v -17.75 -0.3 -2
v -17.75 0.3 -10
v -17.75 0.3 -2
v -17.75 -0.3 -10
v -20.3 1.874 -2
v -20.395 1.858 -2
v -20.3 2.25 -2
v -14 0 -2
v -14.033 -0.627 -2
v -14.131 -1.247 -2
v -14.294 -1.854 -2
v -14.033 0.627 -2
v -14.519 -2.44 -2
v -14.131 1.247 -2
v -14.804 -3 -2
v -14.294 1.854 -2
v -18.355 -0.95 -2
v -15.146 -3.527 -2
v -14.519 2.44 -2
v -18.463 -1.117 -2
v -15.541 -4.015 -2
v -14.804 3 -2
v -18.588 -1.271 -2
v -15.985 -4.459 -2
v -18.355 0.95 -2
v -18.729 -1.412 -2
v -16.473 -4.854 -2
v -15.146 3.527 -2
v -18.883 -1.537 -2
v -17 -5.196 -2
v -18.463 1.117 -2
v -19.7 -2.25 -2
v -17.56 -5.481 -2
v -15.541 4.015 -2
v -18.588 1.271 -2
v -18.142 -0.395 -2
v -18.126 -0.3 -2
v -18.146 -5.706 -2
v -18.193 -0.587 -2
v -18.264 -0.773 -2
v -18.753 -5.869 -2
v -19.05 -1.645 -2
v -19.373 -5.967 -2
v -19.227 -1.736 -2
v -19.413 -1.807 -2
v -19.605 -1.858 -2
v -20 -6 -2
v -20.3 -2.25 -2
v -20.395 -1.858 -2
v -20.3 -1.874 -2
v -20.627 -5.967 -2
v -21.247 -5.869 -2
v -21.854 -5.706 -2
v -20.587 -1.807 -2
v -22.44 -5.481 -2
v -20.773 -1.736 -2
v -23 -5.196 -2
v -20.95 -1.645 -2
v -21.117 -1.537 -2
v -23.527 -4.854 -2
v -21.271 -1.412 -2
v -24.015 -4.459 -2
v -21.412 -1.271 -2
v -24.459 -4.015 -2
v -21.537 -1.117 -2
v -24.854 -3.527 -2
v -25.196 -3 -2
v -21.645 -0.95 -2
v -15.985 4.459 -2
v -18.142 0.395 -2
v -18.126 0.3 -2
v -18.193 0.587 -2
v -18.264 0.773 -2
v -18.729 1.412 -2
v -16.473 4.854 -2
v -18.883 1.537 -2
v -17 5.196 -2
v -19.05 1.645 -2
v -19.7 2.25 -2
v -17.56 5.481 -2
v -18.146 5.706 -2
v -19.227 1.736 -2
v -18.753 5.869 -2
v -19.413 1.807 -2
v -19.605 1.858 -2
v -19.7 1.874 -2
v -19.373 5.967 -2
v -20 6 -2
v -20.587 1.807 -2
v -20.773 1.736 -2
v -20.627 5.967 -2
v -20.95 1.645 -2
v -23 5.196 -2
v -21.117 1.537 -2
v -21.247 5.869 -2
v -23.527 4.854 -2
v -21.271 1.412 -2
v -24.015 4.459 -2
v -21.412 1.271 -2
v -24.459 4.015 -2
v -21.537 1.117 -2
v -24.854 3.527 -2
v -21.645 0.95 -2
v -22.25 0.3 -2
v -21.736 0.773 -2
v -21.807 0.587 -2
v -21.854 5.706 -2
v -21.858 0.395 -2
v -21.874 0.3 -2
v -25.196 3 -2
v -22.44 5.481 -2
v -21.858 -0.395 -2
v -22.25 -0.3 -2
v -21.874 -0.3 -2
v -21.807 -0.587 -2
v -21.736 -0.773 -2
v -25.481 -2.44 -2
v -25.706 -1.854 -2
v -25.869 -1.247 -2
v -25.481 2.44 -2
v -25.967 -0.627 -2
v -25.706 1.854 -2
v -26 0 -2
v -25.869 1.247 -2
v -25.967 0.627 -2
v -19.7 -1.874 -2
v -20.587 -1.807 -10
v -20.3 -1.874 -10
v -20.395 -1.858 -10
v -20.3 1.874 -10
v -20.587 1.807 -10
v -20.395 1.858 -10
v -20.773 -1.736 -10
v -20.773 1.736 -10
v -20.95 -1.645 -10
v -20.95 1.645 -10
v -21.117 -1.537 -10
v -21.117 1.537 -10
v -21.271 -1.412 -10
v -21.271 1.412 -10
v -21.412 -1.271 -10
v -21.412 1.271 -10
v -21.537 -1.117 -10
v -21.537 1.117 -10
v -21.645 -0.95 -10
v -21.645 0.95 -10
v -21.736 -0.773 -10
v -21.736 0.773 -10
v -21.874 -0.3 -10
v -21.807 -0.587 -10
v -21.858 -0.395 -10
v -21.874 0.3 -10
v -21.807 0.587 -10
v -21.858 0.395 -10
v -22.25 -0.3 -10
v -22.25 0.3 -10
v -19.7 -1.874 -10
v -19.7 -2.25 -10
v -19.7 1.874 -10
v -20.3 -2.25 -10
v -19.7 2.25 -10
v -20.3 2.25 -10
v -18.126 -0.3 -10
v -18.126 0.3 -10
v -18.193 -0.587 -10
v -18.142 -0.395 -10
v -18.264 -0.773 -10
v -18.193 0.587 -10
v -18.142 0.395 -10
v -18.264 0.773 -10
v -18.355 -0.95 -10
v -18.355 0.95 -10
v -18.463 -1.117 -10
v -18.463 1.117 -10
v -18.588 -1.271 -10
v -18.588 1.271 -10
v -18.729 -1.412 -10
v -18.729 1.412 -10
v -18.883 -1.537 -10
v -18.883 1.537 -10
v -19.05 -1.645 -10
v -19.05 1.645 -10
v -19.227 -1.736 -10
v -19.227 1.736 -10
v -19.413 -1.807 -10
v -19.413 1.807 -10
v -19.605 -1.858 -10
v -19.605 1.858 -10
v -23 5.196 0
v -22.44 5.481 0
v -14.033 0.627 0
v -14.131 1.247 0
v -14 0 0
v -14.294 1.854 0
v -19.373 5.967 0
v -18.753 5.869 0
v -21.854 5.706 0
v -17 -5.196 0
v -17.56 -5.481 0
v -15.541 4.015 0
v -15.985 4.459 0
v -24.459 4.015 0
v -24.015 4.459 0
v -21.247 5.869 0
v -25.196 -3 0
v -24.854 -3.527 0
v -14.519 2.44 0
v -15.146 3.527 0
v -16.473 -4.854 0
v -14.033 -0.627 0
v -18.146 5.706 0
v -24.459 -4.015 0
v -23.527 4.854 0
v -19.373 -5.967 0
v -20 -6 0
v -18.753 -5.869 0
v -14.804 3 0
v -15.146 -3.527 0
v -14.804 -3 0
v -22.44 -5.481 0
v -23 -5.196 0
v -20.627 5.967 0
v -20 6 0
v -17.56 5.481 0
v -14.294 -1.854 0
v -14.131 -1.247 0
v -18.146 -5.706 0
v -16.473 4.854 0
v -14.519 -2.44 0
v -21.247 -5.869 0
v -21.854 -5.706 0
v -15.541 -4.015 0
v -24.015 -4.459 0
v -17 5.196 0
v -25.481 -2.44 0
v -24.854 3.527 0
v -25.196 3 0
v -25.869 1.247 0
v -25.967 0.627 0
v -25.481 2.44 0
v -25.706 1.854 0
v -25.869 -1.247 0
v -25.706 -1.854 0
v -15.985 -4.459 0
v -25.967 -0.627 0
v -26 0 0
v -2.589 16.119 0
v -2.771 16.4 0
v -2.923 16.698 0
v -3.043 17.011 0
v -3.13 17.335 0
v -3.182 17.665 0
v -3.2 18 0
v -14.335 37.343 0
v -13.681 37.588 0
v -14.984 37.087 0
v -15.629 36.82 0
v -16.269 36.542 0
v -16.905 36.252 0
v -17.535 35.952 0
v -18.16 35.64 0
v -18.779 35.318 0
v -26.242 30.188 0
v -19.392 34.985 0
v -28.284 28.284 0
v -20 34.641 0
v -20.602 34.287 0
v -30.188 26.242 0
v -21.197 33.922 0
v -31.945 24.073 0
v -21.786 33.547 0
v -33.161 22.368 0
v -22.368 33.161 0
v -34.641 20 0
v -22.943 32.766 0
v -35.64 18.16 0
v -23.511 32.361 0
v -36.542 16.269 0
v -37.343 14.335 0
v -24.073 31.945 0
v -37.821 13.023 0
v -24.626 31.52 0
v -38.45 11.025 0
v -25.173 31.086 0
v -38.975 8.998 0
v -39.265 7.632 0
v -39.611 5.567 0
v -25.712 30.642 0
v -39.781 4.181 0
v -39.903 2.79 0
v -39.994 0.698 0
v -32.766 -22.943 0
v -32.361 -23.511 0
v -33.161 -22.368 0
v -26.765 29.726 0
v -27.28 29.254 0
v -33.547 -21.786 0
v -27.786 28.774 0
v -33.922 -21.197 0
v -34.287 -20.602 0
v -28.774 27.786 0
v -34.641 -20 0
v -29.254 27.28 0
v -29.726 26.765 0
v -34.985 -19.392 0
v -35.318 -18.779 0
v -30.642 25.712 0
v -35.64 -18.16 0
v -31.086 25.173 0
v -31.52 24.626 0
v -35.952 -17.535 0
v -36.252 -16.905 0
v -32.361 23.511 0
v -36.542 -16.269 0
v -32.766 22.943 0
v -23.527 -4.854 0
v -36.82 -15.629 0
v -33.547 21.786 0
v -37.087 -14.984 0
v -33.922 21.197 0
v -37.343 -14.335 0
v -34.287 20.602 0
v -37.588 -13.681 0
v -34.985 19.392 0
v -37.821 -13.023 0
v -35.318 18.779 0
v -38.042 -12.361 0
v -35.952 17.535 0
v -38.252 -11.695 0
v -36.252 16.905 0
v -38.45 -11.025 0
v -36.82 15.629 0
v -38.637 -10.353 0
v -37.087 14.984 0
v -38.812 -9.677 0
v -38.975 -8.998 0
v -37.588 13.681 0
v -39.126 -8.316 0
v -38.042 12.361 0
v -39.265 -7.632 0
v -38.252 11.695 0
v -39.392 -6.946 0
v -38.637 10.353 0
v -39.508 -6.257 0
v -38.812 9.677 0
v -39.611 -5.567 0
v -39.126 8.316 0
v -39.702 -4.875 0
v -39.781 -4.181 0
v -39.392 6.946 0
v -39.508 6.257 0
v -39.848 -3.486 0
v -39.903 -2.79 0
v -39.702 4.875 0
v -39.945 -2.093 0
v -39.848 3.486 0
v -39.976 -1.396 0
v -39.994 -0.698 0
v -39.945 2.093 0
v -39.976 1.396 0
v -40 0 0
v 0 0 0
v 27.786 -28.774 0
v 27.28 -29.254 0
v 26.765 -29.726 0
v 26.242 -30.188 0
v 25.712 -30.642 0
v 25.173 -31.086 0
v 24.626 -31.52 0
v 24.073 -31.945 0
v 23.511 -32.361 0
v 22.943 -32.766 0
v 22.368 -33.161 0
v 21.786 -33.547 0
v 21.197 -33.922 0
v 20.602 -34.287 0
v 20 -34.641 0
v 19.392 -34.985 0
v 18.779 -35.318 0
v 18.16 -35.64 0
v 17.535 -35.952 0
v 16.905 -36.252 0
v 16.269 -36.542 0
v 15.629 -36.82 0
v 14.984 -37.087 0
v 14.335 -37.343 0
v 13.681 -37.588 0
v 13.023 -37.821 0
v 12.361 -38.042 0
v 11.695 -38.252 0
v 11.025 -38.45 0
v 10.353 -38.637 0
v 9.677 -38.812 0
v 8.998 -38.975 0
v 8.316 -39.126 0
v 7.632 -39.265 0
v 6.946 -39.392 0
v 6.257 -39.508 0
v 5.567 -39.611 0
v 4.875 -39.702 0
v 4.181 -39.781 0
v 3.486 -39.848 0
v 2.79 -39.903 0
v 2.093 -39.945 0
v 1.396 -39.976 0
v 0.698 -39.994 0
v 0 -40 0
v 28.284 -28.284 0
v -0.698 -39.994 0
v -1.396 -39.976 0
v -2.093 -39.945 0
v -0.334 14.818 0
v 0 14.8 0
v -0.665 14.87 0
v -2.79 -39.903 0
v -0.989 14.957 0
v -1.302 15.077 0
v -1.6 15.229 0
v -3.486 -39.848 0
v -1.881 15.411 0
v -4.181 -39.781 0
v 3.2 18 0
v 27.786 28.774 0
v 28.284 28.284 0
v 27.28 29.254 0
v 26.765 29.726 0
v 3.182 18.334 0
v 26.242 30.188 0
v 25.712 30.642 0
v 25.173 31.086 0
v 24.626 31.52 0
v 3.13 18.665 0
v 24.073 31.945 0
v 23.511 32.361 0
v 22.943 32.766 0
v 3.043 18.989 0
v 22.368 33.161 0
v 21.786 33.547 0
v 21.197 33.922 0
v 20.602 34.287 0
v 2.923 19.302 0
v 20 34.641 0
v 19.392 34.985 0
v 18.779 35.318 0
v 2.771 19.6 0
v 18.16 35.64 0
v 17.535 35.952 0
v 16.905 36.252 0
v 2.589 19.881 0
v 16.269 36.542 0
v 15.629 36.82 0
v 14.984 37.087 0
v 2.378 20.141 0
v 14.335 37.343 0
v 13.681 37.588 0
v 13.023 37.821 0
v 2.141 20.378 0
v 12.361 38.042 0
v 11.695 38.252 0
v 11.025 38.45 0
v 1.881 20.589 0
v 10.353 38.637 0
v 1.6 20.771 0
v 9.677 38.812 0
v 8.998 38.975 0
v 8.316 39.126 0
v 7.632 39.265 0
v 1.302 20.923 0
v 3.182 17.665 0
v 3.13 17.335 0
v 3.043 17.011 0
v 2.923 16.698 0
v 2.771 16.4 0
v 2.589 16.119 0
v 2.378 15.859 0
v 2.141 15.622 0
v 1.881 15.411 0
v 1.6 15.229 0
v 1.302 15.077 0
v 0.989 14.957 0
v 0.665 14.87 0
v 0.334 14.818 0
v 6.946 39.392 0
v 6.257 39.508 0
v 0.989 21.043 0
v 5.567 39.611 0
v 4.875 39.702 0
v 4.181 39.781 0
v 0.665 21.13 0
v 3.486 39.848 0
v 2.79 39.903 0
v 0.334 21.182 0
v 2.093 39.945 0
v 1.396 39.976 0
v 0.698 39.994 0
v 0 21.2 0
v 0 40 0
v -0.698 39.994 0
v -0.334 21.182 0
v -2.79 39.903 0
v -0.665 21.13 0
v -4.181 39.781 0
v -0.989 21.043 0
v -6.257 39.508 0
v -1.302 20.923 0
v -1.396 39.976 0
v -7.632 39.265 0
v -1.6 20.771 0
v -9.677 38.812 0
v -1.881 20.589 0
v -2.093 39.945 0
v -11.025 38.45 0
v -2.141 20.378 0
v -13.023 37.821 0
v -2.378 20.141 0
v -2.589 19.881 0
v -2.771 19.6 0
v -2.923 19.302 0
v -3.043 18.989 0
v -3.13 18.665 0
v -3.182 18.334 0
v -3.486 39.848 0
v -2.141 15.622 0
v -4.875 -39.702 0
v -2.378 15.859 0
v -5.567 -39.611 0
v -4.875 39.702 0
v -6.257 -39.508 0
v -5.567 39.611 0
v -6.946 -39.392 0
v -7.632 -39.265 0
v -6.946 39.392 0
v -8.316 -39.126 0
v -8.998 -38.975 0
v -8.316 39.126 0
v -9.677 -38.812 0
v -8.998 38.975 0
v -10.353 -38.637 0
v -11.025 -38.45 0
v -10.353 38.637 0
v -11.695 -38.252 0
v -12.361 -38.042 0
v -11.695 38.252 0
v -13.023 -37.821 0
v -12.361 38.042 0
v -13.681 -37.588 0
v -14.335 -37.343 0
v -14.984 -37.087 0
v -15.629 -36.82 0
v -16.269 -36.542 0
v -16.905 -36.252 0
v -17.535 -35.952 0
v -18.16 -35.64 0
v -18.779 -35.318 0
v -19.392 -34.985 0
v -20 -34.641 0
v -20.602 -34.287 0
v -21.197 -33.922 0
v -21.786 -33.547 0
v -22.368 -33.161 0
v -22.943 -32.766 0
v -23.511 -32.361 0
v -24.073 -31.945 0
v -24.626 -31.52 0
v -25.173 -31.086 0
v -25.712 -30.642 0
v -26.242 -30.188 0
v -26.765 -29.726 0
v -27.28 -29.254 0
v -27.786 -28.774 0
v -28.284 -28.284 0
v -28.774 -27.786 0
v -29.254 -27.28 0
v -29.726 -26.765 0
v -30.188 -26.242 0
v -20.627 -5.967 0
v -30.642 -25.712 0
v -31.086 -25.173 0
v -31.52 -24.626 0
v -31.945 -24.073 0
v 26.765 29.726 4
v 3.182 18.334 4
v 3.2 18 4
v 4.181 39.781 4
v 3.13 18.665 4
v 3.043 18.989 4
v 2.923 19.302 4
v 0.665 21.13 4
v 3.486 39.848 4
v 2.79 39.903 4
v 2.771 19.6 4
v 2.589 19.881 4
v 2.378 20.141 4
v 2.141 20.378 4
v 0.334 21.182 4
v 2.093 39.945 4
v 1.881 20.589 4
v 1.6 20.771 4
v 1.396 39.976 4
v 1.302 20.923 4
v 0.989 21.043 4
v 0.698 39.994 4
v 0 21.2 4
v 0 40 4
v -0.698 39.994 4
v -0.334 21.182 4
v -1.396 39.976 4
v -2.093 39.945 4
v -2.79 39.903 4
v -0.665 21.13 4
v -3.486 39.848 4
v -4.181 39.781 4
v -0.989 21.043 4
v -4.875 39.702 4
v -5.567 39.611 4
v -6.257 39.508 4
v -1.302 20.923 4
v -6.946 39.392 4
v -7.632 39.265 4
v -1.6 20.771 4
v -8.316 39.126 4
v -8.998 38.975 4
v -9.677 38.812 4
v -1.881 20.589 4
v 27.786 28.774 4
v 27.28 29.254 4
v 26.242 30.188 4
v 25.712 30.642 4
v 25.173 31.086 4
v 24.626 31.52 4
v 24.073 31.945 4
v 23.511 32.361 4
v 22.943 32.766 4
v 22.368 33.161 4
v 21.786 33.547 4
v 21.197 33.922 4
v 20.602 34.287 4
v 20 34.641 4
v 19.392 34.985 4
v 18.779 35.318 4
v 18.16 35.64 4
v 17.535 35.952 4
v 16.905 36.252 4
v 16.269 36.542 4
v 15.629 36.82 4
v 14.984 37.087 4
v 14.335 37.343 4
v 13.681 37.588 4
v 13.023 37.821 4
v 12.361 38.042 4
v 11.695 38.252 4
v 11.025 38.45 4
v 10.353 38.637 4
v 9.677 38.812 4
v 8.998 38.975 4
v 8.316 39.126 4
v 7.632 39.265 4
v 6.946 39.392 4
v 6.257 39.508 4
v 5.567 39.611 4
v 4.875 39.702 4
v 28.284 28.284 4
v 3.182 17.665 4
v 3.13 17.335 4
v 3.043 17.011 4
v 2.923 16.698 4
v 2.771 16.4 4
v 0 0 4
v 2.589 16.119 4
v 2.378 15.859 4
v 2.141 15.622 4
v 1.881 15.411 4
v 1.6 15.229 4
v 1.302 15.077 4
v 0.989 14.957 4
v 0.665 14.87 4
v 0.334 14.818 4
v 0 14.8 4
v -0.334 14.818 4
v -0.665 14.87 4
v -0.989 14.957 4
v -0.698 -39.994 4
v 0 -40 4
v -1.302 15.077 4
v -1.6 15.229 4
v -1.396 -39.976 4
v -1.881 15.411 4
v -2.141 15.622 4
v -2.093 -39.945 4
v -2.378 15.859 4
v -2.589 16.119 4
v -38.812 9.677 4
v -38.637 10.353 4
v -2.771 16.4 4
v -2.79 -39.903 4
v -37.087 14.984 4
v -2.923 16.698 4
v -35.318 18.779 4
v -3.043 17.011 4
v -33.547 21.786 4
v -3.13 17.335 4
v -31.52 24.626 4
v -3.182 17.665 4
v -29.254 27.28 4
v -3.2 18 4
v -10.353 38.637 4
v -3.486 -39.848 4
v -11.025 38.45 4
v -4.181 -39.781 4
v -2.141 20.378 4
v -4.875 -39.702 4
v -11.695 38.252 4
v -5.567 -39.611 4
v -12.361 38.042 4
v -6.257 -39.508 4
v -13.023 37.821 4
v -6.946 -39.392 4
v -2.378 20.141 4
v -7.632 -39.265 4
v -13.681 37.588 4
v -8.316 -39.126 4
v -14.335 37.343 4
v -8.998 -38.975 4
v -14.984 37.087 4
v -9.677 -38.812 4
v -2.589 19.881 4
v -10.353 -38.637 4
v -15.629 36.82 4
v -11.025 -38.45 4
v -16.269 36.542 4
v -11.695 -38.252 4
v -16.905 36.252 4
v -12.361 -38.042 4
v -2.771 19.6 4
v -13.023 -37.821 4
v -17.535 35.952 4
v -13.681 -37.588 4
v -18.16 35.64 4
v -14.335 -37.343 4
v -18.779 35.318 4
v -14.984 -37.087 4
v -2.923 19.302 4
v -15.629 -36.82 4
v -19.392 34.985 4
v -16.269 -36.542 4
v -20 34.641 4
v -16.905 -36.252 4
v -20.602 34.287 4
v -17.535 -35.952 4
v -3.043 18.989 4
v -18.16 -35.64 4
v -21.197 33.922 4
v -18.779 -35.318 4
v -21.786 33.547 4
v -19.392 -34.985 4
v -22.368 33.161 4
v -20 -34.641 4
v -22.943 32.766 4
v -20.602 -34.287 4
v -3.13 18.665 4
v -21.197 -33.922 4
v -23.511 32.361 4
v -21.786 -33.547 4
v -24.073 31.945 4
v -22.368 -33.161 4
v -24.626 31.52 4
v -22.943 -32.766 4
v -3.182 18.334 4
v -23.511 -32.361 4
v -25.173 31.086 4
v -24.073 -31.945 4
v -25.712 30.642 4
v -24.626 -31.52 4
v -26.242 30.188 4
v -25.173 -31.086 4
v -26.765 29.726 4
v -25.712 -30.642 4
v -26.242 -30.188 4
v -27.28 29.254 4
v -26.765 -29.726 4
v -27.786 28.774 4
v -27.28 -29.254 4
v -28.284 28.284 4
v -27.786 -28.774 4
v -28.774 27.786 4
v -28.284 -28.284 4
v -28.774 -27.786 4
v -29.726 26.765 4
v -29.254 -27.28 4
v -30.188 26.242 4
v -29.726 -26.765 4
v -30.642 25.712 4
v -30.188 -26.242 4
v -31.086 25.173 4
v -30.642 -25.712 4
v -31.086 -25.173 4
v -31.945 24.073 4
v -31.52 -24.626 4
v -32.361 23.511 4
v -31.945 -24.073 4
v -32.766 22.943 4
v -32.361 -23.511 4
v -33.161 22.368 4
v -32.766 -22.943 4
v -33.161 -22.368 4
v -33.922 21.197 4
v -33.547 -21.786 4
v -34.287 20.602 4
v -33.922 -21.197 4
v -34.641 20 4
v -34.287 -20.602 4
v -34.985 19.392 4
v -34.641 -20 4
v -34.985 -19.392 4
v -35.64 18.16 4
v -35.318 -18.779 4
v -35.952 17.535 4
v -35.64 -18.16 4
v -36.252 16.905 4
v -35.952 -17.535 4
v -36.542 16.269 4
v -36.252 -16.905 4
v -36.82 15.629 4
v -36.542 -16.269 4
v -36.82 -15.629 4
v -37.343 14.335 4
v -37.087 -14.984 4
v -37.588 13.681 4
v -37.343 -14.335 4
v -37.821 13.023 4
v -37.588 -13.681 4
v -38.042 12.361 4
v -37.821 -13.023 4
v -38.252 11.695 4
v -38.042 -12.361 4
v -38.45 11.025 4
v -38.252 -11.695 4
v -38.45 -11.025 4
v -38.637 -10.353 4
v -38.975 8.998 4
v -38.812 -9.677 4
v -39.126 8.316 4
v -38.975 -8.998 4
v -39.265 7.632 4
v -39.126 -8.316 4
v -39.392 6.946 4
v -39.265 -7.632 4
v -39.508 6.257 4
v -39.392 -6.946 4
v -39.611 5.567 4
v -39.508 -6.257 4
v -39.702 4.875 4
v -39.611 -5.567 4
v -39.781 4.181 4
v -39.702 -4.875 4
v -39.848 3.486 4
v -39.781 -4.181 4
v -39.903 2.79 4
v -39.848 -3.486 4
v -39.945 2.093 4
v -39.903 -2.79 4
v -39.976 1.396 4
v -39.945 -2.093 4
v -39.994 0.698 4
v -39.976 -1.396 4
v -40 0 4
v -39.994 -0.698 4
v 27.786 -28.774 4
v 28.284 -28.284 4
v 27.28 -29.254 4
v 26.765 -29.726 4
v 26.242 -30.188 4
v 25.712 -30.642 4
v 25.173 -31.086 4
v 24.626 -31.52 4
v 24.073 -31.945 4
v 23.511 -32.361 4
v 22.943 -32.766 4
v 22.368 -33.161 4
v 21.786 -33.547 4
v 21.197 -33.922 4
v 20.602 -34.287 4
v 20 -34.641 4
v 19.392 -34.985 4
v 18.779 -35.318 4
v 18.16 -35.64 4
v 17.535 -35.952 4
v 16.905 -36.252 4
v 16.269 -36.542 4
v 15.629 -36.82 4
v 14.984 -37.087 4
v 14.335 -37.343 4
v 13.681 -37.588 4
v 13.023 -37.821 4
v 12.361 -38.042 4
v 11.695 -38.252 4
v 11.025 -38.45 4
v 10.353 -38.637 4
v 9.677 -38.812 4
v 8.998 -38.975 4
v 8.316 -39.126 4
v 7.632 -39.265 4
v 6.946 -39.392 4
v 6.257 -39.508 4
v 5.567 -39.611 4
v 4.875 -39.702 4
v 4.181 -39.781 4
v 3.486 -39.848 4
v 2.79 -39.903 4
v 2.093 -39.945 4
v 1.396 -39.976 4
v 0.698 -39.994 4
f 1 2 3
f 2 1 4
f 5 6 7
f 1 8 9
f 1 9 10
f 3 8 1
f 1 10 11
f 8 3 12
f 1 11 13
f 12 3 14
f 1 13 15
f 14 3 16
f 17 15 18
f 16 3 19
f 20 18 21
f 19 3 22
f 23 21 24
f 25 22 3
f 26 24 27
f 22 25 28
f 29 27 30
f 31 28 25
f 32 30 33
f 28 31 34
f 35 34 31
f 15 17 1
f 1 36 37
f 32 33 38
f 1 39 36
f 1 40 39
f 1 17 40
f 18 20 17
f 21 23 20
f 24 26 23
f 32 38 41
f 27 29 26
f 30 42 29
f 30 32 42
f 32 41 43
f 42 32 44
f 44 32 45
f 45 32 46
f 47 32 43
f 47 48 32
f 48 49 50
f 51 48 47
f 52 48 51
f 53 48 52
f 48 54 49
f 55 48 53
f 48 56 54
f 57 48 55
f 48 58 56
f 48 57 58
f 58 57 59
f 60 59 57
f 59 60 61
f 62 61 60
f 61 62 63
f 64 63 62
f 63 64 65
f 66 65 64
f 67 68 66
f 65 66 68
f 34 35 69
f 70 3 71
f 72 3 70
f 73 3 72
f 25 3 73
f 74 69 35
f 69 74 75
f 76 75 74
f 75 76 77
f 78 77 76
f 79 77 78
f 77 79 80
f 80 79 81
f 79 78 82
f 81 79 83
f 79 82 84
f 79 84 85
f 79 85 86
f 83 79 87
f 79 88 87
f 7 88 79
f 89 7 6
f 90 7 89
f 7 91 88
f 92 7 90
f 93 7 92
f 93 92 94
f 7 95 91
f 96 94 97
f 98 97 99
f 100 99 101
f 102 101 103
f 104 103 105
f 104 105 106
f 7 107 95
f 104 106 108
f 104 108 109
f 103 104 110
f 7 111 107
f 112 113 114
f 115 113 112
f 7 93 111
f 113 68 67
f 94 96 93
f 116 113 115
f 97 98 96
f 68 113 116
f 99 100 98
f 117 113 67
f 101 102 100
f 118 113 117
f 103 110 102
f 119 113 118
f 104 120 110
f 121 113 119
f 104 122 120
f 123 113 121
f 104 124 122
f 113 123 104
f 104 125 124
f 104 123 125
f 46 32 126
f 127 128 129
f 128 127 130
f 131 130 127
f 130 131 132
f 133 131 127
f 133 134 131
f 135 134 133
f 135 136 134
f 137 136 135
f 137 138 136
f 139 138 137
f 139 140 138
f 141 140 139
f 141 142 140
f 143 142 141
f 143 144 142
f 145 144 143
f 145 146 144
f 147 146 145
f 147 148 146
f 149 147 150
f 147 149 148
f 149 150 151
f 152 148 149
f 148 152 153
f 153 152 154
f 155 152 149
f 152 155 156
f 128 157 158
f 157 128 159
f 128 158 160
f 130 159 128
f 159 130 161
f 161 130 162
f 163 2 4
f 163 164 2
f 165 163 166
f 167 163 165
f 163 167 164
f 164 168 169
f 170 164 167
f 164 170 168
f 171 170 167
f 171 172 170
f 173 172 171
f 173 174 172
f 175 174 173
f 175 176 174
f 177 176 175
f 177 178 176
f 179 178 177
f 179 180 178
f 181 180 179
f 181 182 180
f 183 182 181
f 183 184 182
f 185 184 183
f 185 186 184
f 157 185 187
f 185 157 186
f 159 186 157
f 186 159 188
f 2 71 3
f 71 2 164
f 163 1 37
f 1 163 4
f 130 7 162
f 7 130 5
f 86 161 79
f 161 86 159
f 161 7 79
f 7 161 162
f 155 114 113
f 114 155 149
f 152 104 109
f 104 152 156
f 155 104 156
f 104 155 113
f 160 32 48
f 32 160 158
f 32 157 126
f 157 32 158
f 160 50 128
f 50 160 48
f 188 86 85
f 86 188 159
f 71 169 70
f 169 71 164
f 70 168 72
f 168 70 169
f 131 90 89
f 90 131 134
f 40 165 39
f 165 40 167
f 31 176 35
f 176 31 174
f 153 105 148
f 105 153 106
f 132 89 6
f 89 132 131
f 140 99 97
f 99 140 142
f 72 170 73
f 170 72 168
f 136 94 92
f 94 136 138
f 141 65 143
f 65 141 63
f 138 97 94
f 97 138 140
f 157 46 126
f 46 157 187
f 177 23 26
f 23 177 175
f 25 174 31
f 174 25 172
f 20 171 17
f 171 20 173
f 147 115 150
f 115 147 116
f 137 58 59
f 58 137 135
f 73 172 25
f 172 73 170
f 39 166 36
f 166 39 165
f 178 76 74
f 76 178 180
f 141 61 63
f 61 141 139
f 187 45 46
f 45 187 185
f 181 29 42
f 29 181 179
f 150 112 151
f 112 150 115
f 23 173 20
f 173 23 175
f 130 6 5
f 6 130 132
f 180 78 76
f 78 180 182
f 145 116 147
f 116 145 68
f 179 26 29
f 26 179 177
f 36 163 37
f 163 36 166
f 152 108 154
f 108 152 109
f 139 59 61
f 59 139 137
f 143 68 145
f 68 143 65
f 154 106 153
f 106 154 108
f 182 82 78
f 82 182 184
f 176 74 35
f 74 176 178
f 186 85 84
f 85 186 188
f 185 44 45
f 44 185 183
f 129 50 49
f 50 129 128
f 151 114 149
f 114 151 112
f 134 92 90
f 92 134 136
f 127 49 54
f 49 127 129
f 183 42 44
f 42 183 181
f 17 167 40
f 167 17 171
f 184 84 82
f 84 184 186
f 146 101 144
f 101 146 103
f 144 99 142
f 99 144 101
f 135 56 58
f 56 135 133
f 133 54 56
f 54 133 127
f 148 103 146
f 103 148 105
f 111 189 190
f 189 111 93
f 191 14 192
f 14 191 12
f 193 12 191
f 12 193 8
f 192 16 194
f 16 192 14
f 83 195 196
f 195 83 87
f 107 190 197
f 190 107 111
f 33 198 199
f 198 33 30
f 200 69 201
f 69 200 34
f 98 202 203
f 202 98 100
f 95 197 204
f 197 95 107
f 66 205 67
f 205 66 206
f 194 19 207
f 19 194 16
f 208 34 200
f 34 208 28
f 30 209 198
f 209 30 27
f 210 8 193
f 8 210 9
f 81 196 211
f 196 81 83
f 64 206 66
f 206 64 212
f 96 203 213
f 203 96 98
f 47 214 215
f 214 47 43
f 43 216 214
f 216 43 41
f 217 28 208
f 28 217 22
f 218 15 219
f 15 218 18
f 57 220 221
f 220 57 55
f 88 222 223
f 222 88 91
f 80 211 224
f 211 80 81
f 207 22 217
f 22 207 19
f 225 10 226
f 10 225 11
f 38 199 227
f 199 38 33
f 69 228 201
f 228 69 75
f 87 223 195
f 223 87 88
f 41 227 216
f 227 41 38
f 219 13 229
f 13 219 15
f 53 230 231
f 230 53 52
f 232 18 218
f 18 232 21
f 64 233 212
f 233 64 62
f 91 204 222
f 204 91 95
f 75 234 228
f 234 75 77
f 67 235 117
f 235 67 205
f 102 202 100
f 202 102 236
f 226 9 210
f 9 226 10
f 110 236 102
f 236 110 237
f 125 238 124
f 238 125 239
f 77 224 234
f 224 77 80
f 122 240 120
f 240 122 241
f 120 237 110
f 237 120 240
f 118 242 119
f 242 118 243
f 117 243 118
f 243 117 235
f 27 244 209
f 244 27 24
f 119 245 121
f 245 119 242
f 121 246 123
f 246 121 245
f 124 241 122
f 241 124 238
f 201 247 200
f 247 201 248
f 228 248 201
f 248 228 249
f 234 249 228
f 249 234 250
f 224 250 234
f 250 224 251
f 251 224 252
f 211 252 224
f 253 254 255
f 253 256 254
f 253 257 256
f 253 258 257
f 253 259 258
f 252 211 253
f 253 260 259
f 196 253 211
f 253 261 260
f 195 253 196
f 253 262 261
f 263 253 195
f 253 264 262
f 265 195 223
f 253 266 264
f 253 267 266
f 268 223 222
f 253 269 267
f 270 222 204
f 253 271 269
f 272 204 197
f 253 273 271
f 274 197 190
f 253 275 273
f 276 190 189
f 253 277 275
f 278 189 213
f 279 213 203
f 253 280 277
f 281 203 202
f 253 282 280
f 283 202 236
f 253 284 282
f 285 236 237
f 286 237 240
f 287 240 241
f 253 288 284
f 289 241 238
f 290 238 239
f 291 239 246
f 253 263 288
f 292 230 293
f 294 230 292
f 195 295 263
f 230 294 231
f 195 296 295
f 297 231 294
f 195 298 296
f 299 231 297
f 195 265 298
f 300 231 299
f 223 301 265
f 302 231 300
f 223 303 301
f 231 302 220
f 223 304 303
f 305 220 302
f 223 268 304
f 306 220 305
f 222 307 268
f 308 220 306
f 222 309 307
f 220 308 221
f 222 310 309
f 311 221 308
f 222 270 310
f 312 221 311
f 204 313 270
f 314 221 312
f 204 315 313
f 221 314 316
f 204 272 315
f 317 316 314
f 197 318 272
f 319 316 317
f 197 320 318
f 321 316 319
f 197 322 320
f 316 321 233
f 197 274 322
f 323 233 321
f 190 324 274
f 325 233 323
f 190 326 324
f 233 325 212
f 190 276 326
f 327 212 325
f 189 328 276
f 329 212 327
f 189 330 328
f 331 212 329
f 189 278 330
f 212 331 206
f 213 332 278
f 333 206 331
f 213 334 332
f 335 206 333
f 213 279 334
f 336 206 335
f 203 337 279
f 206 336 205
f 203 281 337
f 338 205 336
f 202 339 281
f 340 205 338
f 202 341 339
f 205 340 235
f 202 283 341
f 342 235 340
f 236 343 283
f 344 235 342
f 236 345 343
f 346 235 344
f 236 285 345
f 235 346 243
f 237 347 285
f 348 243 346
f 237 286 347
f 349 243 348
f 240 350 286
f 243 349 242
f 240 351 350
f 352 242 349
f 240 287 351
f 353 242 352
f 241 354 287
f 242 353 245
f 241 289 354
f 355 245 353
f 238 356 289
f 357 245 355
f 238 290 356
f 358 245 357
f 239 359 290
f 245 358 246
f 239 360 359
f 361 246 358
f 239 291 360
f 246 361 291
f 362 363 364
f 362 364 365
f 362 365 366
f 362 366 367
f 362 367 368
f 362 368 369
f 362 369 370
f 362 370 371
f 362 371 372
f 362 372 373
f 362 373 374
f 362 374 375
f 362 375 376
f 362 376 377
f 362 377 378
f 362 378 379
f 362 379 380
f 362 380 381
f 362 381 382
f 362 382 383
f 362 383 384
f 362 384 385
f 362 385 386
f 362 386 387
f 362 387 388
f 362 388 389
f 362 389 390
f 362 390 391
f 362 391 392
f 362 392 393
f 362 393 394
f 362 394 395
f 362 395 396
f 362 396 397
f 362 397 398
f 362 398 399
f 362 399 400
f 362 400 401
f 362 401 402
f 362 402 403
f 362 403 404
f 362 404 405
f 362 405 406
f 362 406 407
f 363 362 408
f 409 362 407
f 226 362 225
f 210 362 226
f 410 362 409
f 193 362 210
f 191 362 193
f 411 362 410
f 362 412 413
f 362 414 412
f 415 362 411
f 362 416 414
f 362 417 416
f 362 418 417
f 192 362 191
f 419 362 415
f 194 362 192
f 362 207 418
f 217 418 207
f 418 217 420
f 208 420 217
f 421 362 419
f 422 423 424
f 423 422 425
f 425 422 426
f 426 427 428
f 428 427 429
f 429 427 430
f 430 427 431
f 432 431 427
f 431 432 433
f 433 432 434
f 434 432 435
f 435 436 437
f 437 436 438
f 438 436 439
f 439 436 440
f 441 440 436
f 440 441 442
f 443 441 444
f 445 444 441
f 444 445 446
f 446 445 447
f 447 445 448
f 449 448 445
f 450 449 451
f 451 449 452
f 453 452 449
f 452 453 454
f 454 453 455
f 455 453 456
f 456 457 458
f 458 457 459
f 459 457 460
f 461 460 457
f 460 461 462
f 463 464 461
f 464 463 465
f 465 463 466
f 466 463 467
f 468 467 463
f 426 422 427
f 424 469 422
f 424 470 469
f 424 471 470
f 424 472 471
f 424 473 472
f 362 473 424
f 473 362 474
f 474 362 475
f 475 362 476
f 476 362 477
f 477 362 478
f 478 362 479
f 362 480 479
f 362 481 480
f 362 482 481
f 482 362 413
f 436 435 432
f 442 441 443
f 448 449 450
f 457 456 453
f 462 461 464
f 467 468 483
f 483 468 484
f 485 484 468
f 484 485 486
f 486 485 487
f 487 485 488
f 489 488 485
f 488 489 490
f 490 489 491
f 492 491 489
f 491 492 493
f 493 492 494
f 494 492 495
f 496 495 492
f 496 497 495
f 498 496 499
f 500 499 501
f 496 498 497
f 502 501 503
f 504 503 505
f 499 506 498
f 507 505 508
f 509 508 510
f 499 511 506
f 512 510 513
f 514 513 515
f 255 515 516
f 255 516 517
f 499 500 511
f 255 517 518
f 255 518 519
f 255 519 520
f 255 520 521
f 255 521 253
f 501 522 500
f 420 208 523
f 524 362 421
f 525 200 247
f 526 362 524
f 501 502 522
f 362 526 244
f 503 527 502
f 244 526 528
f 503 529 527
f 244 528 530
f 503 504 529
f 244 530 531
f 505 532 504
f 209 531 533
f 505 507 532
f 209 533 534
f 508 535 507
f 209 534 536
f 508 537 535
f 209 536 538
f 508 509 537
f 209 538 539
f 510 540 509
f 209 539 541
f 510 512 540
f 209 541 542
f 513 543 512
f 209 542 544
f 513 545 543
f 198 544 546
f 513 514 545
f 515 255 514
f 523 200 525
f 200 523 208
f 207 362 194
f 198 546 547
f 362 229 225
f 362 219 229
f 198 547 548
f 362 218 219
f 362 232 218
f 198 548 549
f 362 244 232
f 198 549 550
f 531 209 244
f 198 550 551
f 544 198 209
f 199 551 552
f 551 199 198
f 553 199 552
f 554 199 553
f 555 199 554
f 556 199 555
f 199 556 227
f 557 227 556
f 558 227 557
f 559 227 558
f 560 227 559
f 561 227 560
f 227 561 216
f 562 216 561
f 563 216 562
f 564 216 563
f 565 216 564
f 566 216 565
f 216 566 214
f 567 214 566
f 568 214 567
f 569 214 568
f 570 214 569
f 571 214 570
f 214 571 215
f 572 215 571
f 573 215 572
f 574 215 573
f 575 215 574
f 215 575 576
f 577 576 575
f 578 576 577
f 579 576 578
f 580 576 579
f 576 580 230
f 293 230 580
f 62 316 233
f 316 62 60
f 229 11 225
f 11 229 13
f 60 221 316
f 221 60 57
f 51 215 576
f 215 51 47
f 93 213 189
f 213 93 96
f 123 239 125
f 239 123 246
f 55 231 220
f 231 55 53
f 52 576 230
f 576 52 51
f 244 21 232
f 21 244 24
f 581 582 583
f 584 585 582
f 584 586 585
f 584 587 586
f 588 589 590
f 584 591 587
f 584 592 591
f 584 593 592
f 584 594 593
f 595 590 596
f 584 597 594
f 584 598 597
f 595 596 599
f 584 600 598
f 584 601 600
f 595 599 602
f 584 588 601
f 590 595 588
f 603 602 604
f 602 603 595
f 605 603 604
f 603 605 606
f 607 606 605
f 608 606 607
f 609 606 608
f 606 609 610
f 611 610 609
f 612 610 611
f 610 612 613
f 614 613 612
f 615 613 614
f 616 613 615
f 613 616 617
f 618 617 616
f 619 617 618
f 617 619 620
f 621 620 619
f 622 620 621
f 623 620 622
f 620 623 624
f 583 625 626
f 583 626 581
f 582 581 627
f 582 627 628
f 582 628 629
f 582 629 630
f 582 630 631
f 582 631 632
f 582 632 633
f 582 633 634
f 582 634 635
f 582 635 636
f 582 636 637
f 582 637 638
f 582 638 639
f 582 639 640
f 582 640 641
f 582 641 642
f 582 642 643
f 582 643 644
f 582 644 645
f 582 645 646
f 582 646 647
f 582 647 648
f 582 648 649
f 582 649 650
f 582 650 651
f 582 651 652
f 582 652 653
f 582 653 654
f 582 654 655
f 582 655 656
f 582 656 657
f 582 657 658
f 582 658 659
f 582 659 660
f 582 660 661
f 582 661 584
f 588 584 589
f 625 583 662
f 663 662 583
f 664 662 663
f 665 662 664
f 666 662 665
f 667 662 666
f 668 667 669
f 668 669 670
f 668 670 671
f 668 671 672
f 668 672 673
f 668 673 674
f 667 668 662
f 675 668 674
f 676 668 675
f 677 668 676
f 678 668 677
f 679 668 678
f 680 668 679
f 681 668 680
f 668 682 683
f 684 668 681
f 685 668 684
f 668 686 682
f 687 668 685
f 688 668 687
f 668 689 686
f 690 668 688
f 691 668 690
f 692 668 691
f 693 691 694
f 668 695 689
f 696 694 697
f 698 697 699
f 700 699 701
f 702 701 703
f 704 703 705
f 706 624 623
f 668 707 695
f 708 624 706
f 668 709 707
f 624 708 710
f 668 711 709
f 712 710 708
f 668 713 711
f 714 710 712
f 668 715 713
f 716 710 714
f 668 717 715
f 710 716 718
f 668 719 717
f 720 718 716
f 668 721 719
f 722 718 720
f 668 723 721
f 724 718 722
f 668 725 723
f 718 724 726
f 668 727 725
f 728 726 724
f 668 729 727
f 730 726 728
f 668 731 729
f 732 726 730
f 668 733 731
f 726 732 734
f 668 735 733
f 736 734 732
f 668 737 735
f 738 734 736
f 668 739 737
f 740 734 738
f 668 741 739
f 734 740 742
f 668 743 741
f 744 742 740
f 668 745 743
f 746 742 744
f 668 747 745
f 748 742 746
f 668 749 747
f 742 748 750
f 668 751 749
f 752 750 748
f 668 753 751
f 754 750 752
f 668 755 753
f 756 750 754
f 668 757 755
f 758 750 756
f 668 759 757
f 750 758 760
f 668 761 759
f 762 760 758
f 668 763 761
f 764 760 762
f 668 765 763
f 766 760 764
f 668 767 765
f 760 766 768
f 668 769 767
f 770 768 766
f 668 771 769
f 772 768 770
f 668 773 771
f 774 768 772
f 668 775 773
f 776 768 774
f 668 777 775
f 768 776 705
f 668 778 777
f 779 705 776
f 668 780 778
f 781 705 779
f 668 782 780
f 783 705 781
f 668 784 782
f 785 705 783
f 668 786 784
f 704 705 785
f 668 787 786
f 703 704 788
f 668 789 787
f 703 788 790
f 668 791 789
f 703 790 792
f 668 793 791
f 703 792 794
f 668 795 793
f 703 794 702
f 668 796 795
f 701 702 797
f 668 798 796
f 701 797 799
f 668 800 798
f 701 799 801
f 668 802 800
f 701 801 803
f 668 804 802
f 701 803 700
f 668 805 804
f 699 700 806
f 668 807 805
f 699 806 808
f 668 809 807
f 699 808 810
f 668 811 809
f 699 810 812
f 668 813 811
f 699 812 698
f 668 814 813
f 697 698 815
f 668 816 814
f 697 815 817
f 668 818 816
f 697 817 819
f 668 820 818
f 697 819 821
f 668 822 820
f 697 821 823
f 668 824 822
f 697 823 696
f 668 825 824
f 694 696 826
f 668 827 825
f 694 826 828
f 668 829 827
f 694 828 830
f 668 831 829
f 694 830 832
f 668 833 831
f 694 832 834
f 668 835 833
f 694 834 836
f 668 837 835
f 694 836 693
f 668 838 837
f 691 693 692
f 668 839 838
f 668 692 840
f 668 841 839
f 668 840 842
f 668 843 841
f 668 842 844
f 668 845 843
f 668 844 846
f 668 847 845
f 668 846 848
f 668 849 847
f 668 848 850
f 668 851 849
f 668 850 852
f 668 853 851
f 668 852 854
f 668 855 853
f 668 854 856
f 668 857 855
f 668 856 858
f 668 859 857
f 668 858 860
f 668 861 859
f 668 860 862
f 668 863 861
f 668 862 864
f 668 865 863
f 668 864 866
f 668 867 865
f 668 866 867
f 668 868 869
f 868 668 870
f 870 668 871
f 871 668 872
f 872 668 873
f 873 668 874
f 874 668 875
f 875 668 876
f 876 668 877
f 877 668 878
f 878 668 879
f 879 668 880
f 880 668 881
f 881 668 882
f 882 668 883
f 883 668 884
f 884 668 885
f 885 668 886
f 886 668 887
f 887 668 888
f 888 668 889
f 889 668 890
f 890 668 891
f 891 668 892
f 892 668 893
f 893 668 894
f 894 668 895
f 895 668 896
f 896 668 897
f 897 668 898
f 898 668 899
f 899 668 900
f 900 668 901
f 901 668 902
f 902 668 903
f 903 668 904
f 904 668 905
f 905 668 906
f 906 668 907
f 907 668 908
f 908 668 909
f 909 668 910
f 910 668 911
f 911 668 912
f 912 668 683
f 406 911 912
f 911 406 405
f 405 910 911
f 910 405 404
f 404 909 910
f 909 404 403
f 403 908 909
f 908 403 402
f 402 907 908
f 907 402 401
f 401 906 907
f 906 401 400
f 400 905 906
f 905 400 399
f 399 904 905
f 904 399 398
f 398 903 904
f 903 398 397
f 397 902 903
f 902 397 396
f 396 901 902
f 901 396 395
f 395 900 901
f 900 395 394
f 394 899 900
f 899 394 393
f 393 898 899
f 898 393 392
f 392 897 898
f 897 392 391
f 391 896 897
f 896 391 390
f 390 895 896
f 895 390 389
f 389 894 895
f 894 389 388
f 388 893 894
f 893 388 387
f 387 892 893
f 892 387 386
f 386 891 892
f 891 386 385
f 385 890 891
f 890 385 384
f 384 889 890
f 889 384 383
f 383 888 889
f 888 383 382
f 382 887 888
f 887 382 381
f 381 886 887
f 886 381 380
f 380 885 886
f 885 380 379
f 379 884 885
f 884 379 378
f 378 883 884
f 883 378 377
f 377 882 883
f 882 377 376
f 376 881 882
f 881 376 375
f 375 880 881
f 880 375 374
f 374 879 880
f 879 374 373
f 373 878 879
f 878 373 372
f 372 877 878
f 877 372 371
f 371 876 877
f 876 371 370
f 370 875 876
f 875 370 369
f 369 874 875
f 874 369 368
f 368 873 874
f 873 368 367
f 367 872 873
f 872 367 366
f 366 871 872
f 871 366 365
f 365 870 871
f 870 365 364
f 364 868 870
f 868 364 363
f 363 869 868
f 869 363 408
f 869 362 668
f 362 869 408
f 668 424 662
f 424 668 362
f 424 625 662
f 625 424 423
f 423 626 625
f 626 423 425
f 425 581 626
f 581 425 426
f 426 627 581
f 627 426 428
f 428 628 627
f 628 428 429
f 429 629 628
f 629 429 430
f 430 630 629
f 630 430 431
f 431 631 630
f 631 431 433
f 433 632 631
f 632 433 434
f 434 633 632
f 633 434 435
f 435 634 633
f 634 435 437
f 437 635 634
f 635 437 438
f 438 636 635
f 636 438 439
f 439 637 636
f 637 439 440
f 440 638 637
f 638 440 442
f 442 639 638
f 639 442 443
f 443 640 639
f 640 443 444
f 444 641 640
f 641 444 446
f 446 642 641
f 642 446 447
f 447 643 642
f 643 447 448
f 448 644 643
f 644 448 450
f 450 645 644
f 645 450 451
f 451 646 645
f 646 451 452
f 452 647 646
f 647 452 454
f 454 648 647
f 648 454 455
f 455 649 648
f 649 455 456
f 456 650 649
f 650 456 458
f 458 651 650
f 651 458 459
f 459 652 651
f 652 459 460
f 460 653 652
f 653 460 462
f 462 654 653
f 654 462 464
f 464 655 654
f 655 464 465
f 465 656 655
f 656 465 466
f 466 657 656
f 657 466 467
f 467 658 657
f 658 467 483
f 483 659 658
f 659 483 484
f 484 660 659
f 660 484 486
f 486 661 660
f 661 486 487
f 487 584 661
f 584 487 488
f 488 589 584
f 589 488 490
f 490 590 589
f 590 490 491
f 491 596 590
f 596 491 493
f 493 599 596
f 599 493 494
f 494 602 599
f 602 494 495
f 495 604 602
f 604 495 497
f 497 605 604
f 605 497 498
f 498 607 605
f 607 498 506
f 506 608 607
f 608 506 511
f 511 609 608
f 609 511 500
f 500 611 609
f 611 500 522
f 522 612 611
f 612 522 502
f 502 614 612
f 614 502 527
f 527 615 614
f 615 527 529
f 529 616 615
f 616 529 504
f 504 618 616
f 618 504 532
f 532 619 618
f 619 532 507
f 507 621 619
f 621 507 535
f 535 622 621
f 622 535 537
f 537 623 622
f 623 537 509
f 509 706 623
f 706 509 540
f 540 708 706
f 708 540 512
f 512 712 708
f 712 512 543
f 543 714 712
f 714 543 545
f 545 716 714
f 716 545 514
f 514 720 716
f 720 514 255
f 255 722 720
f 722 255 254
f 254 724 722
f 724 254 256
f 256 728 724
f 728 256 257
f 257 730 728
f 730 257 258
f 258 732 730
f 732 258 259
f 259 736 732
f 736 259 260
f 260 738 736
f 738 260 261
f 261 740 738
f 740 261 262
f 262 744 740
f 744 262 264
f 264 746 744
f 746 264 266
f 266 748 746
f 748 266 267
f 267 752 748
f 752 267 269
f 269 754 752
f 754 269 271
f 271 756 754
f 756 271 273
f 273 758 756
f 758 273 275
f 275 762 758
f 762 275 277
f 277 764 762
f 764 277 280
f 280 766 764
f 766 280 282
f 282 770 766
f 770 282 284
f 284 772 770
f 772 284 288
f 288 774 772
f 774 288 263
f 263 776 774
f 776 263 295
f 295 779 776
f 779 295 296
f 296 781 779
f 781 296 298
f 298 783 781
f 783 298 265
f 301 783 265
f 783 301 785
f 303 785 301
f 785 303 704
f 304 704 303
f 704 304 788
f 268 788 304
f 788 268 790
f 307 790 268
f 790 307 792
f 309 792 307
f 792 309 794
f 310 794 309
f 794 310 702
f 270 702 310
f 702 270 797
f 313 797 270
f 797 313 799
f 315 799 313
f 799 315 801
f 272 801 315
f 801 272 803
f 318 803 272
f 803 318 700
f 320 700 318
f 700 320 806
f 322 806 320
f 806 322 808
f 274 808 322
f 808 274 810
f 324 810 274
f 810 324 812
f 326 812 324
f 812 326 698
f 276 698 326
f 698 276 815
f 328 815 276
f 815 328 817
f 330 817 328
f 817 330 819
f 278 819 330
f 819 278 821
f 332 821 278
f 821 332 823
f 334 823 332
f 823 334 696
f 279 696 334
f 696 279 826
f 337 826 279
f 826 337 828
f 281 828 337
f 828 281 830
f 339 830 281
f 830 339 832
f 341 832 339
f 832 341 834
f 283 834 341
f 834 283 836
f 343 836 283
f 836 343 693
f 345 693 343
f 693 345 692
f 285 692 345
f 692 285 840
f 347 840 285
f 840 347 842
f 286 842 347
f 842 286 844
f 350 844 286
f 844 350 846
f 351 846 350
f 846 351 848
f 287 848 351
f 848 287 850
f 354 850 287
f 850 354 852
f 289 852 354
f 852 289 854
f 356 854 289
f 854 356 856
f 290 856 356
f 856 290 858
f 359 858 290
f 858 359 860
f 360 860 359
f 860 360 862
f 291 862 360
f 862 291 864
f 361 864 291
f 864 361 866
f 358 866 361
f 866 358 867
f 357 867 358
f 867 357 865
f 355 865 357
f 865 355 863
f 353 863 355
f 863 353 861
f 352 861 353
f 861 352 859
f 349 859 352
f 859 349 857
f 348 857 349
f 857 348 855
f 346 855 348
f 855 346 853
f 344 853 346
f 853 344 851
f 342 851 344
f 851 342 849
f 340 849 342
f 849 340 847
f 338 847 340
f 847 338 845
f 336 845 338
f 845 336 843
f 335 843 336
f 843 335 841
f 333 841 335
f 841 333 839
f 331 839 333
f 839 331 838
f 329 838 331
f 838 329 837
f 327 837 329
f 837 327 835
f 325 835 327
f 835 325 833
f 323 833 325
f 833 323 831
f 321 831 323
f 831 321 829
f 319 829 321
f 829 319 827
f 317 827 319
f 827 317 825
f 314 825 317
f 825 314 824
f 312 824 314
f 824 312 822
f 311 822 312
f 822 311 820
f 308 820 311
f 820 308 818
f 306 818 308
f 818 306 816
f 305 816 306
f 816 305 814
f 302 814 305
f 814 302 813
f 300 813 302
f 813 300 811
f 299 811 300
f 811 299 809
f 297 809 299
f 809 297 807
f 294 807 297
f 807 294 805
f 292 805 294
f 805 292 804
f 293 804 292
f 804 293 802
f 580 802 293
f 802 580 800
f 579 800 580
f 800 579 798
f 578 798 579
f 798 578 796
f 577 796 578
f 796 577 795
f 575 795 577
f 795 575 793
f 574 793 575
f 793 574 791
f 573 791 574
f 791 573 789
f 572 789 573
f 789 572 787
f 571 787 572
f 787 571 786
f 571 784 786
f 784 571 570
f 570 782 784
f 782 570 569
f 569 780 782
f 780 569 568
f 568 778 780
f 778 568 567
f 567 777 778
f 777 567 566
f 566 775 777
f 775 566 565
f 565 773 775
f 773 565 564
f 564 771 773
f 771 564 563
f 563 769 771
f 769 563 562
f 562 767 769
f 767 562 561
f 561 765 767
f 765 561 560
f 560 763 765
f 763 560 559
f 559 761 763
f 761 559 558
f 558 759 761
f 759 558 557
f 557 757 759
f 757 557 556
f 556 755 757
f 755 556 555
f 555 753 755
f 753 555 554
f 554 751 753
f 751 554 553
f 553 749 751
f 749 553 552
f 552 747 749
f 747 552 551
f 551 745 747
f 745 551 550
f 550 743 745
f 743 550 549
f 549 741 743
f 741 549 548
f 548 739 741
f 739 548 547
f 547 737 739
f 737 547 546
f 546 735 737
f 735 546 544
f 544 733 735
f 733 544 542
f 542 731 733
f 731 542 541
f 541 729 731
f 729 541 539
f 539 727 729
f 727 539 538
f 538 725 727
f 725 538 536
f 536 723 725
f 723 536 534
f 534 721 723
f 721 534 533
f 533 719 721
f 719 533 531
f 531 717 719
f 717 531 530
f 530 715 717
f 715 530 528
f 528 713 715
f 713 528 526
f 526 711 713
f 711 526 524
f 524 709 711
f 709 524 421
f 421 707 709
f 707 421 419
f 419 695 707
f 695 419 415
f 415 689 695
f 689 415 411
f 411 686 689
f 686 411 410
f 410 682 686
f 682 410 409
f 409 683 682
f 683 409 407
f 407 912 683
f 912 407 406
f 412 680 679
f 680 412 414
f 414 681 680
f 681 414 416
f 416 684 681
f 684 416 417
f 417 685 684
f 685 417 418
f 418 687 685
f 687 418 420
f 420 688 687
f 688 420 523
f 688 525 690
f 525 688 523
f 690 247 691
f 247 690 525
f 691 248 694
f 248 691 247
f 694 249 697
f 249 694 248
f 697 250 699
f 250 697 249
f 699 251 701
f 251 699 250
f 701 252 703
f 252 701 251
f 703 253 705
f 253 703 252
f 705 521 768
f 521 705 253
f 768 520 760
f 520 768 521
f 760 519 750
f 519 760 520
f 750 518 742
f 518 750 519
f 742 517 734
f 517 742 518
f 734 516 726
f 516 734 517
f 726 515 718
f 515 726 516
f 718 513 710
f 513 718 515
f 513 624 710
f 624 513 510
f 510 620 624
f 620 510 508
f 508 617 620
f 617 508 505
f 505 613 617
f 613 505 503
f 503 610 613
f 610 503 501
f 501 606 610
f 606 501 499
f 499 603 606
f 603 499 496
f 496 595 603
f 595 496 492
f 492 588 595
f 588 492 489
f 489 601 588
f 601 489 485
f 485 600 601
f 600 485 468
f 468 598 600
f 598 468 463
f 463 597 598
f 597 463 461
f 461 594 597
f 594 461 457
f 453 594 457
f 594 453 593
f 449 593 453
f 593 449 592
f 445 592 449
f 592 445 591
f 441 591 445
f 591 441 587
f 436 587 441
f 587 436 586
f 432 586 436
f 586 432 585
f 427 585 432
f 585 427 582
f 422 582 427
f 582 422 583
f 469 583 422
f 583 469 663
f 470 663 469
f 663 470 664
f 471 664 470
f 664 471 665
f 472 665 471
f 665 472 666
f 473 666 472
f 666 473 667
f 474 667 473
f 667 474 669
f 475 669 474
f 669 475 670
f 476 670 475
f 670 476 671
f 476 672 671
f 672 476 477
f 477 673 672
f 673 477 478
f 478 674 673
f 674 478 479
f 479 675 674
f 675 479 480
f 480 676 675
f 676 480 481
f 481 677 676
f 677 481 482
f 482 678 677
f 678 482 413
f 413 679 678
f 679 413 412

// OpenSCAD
$fn = 60;

module pocok(pocok_magassag=8) {
    union() {
        cylinder(d=3.8, h=pocok_magassag);
        for(szog=[0, 90, 180, 270]) {
            rotate([0, 0, szog]) translate([1.85, -0.3, 0]) cube([0.4, 0.6, pocok_magassag]);
        }
    }
}

module pacman_jelveny(meret = 80, magassag = 4) {
    sugar = meret/2;
    union() {
        linear_extrude(height = magassag) {
            difference() {
                polygon([
                    [0,0],
                    for (szog = [45 : 1 : 315]) [ sugar*cos(szog), sugar*sin(szog) ]
                ]);
                translate([0, sugar*0.45]) circle(r = sugar*0.08);
            }
        }
        translate([-sugar*0.5, 0, 0]) {
            translate([0, 0, -2]) cylinder(d=12, h=2); 
            translate([0, 0, -10]) pocok(8);
        }
    }
}

pacman_jelveny();
